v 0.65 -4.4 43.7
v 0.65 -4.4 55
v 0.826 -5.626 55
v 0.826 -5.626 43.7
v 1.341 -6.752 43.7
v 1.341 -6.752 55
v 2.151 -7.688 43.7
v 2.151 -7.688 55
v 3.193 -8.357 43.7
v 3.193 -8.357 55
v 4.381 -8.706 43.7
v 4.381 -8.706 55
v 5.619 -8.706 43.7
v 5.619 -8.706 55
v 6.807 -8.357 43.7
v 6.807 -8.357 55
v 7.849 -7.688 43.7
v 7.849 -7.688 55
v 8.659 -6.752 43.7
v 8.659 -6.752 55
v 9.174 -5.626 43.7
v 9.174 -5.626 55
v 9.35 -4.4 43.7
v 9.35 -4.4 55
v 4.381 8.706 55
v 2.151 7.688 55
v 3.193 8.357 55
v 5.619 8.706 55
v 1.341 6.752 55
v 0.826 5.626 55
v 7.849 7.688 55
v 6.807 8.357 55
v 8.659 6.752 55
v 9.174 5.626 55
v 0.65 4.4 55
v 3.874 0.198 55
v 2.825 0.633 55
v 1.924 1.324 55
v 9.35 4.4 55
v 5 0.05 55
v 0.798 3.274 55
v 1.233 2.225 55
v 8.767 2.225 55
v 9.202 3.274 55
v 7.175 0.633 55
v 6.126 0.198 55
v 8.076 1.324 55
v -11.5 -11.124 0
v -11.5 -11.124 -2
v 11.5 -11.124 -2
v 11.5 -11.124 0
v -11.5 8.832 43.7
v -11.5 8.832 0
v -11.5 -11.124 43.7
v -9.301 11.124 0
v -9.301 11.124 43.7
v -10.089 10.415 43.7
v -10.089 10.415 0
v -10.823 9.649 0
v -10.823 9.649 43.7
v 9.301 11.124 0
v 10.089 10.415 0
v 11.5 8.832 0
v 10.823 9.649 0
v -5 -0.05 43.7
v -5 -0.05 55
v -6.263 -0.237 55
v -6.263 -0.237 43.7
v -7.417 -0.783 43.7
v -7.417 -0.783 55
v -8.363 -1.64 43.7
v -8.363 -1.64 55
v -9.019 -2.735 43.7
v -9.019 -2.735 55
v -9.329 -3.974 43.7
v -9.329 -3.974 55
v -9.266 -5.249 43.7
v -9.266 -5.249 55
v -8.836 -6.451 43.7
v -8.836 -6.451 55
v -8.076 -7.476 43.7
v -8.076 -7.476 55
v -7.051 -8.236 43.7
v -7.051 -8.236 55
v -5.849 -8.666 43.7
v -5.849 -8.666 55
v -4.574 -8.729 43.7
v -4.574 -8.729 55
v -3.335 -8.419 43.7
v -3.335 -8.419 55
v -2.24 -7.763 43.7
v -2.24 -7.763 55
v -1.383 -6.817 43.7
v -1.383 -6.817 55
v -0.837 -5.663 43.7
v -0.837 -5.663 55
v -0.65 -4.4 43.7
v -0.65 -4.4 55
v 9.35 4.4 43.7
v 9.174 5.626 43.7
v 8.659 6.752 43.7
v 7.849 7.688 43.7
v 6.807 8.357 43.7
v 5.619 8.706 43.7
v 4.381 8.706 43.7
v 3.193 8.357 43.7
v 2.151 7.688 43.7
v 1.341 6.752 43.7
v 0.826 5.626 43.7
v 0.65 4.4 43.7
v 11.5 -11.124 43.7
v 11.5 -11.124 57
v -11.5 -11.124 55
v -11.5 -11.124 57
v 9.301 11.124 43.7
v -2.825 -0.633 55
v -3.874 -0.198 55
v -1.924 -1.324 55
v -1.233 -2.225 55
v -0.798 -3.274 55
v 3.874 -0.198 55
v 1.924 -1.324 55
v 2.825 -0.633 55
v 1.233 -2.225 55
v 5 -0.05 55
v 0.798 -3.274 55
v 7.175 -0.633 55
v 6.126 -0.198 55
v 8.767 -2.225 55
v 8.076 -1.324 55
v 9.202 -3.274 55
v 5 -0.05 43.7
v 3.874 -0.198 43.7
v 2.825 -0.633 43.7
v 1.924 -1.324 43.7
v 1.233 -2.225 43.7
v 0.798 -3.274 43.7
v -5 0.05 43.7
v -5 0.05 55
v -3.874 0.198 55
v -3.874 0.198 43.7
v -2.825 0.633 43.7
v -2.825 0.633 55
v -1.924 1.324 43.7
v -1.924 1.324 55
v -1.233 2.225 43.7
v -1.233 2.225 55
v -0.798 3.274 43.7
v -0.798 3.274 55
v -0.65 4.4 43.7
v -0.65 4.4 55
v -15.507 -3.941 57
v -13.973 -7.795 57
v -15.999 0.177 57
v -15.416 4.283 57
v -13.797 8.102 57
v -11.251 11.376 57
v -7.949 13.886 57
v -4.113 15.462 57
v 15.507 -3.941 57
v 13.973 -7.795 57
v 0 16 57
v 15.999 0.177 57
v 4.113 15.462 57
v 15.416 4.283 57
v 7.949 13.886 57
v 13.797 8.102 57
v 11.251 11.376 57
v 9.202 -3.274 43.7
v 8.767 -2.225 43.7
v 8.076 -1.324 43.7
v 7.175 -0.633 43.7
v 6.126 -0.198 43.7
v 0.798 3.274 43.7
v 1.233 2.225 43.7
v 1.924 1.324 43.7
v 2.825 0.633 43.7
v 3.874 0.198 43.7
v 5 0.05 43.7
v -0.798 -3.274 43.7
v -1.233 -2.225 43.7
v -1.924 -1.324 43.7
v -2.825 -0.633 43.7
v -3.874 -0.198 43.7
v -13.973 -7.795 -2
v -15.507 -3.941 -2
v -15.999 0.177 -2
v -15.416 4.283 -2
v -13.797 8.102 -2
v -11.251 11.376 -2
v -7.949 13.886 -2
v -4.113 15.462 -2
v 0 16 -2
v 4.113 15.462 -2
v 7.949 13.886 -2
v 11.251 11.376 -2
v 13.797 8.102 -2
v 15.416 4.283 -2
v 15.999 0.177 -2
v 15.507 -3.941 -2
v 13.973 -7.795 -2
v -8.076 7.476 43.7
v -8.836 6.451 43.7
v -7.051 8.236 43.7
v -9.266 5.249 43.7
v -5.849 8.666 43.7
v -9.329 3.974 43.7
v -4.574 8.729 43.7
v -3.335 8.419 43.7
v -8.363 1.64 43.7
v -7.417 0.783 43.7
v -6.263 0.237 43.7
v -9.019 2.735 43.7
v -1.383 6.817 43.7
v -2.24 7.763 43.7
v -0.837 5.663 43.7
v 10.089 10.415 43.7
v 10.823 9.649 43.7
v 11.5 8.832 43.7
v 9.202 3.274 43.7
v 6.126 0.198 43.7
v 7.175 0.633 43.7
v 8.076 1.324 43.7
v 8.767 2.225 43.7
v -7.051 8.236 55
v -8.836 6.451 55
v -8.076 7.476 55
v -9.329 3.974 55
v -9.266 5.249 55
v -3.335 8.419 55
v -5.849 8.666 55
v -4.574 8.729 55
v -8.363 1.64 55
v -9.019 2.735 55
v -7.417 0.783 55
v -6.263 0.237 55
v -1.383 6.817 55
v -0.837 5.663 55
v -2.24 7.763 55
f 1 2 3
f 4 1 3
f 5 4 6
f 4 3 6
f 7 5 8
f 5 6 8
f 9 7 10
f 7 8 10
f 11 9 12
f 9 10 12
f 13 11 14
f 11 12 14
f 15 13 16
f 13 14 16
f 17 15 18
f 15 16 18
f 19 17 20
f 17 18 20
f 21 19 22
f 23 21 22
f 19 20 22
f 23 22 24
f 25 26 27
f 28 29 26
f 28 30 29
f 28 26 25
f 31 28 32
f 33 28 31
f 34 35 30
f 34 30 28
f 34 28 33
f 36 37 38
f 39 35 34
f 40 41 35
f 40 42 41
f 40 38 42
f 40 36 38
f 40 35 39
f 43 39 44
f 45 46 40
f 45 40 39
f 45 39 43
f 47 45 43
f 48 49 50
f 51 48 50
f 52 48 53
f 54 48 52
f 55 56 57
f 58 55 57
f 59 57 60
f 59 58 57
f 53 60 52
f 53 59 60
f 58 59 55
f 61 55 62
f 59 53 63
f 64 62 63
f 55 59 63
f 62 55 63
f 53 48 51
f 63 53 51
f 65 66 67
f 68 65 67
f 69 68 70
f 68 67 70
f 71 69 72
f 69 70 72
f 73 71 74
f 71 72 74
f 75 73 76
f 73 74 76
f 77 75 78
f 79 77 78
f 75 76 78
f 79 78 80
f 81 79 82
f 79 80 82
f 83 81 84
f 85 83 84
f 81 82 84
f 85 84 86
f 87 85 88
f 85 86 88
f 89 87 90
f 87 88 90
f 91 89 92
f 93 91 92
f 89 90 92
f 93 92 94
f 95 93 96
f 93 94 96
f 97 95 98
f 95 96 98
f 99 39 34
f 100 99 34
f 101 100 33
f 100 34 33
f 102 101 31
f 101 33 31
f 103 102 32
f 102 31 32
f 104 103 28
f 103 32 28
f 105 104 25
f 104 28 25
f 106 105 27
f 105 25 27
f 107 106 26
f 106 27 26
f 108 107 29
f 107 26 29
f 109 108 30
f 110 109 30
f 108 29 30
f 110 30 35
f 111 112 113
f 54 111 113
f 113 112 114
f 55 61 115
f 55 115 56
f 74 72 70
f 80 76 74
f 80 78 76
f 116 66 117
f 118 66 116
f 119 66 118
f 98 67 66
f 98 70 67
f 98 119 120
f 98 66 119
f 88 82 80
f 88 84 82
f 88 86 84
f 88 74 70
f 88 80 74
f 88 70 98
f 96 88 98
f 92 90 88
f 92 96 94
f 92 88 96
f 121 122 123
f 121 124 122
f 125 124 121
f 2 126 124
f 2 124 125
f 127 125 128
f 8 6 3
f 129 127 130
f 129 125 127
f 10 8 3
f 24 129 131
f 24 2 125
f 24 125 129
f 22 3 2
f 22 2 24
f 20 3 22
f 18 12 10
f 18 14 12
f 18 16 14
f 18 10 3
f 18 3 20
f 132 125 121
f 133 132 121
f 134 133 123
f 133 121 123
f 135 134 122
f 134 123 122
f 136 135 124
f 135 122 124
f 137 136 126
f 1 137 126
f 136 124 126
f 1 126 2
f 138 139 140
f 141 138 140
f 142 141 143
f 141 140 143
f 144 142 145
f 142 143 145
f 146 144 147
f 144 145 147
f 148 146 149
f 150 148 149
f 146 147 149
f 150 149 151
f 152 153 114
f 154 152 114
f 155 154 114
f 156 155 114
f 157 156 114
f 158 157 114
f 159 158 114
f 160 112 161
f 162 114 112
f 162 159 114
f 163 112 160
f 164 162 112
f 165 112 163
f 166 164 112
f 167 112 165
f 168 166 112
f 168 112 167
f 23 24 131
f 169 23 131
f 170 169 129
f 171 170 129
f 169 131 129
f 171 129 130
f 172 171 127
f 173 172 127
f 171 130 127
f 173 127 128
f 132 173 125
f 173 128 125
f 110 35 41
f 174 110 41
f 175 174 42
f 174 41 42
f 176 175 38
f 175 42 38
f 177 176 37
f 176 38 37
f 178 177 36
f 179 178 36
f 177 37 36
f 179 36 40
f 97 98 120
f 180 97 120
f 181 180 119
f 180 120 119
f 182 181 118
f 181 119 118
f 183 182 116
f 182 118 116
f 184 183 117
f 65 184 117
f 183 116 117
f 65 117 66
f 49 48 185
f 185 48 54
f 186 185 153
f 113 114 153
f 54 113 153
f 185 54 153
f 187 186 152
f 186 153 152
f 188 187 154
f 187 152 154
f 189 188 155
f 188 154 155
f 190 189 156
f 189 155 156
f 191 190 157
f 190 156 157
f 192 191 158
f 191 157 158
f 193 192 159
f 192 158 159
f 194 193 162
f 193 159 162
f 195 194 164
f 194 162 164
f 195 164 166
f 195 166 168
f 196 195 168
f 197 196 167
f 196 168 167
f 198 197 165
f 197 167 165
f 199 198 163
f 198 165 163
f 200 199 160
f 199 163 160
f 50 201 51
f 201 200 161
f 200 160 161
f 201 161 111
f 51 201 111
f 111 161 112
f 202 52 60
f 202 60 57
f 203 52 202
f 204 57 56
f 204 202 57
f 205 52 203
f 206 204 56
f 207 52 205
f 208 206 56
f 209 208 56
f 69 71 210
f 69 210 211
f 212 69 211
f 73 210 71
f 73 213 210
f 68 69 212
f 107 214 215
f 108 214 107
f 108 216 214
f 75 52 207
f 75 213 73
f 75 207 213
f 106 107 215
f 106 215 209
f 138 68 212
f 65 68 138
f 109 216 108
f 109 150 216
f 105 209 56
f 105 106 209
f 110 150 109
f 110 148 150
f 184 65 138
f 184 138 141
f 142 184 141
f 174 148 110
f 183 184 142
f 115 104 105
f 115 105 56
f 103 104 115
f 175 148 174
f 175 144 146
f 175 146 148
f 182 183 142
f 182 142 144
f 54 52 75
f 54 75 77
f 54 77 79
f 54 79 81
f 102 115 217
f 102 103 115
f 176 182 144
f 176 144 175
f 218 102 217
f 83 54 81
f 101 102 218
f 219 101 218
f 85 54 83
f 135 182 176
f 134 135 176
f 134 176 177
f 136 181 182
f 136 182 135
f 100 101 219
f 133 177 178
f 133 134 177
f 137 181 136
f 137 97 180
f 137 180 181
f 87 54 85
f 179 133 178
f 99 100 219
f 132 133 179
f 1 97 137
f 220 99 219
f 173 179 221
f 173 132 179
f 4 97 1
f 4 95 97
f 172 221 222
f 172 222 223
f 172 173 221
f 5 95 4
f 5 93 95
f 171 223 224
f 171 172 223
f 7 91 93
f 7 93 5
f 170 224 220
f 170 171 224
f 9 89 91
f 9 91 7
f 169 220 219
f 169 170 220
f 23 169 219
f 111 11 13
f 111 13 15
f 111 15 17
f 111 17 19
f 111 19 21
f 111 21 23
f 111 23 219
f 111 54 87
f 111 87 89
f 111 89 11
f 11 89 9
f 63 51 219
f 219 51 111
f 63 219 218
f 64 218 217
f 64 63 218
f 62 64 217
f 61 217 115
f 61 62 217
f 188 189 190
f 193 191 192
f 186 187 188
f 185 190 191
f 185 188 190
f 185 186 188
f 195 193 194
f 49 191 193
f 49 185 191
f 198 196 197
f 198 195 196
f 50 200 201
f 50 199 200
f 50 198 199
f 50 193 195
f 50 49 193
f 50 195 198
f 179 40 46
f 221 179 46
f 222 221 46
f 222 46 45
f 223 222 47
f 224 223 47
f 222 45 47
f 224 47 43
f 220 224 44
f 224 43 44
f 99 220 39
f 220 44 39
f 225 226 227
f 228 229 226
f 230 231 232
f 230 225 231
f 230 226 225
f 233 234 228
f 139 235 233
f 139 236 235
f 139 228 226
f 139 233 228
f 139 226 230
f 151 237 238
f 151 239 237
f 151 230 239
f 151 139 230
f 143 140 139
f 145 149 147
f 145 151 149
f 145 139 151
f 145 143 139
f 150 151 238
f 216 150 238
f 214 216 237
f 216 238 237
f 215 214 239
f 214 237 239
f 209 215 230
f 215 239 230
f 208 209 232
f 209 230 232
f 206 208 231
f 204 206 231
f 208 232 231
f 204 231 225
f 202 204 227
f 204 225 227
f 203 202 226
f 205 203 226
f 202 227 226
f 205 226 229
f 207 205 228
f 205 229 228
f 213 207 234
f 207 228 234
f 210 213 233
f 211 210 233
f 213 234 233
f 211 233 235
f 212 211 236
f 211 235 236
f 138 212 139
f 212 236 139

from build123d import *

# Parameters (mm, degrees)
F0_R      = 16
F0_R_2    = 14.5
F1_DEPTH  = 55
F2_R      = 16
F3_DEPTH  = 2
F4_R      = 16
F5_DEPTH  = 2
F7_DEPTH  = 59.001
F9_DEPTH  = 58
F10_W     = 23
F10_H     = 55
F11_DEPTH = 3
F13_DEPTH = 11.3


with BuildPart() as f1:
    # F0 (on Top) → F1 (new body)
    with BuildSketch(Plane.XY):
        Circle(F0_R)
        Circle(F0_R_2, mode=Mode.SUBTRACT)
    extrude(amount=F1_DEPTH)

    # F2 (on face) → F3 (join)
    with BuildSketch(Plane.XY.offset(55)):
        Circle(F2_R)
    extrude(amount=F3_DEPTH)

    # F4 (on face) → F5 (join)
    with BuildSketch(Plane(origin=(0, 0, 0), x_dir=(1, 0, 0), z_dir=(0, 0, -1))):
        Circle(F4_R)
    extrude(amount=F5_DEPTH)

    # F6 (on face) → F7 (cut, through all)
    with BuildSketch(Plane(origin=(0, 0, -2), x_dir=(1, 0, 0), z_dir=(0, 0, -1))):
        with BuildLine():
            Line((-11.5, 11.1242977306), (11.5, 11.1242977306))
            ThreePointArc((11.5, 11.1242977306), (0, 16), (-11.5, 11.1242977306))
        make_face()
    extrude(amount=-F7_DEPTH, mode=Mode.SUBTRACT)

    # F8 (on face) → F9 (join)
    with BuildSketch(Plane(origin=(0, 0, -2), x_dir=(1, 0, 0), z_dir=(0, 0, -1))):
        with BuildLine():
            Line((-11.5, -11.1242977306), (-11.5, 11.1242977306))
            ThreePointArc((-11.5, 11.1242977306), (-16, 0), (-11.5, -11.1242977306))
        make_face()
        with BuildLine():
            ThreePointArc((-11.5, -11.1242977306), (0, -16), (11.5, -11.1242977306))
            Line((11.5, -11.1242977306), (-11.5, -11.1242977306))
        make_face()
        with BuildLine():
            ThreePointArc((11.5, -11.1242977306), (16, 0), (11.5, 11.1242977306))
            Line((11.5, 11.1242977306), (11.5, -11.1242977306))
        make_face()
    extrude(amount=-F9_DEPTH)

    # F10 (on face) → F11 (cut)
    with BuildSketch(Plane.XZ.offset(11.1242977306)):
        with Locations((0, 27.5)):
            Rectangle(F10_W, F10_H)
    extrude(amount=-F11_DEPTH, mode=Mode.SUBTRACT)

    # F12 (on face) → F13 (join)
    with BuildSketch(Plane(origin=(0, 0, 55), x_dir=(1, 0, 0), z_dir=(0, 0, -1))):
        with BuildLine():
            Line((11.5, -8.8317608663), (11.5, 11.1242977306))
            Line((11.5, 11.1242977306), (-11.5, 11.1242977306))
            Line((-11.5, 11.1242977306), (-11.5, -8.8317608663))
            ThreePointArc((-11.5, -8.8317608663), (-10.4632462758, -10.0384499487), (-9.3005376189, -11.1242977306))
            Line((-9.3005376189, -11.1242977306), (9.3005376189, -11.1242977306))
            ThreePointArc((9.3005376189, -11.1242977306), (10.4632462758, -10.0384499487), (11.5, -8.8317608663))
        make_face()
        with BuildLine():
            Line((0.65, -4.4), (-0.65, -4.4))
            ThreePointArc((-0.65, -4.4), (-8.0759144982, -7.4759144982), (-5, -0.05))
            Line((-5, -0.05), (-5, 0.05))
            ThreePointArc((-5, 0.05), (-8.0759144982, 7.4759144982), (-0.65, 4.4))
            Line((-0.65, 4.4), (0.65, 4.4))
            ThreePointArc((0.65, 4.4), (5, 8.75), (9.35, 4.4))
            ThreePointArc((9.35, 4.4), (8.0759144982, 1.3240855018), (5, 0.05))
            Line((5, 0.05), (5, -0.05))
            ThreePointArc((5, -0.05), (8.0759144982, -1.3240855018), (9.35, -4.4))
            ThreePointArc((9.35, -4.4), (5, -8.75), (0.65, -4.4))
        make_face(mode=Mode.SUBTRACT)
        with BuildLine():
            ThreePointArc((-5, -0.05), (-1.9240855018, -1.3240855018), (-0.65, -4.4))
            Line((-0.65, -4.4), (0.65, -4.4))
            ThreePointArc((0.65, -4.4), (1.9240855018, -1.3240855018), (5, -0.05))
            Line((5, -0.05), (5, 0.05))
            ThreePointArc((5, 0.05), (1.9240855018, 1.3240855018), (0.65, 4.4))
            Line((0.65, 4.4), (-0.65, 4.4))
            ThreePointArc((-0.65, 4.4), (-1.9240855018, 1.3240855018), (-5, 0.05))
            Line((-5, 0.05), (-5, -0.05))
        make_face()
    extrude(amount=F13_DEPTH)


solid = f1.part
